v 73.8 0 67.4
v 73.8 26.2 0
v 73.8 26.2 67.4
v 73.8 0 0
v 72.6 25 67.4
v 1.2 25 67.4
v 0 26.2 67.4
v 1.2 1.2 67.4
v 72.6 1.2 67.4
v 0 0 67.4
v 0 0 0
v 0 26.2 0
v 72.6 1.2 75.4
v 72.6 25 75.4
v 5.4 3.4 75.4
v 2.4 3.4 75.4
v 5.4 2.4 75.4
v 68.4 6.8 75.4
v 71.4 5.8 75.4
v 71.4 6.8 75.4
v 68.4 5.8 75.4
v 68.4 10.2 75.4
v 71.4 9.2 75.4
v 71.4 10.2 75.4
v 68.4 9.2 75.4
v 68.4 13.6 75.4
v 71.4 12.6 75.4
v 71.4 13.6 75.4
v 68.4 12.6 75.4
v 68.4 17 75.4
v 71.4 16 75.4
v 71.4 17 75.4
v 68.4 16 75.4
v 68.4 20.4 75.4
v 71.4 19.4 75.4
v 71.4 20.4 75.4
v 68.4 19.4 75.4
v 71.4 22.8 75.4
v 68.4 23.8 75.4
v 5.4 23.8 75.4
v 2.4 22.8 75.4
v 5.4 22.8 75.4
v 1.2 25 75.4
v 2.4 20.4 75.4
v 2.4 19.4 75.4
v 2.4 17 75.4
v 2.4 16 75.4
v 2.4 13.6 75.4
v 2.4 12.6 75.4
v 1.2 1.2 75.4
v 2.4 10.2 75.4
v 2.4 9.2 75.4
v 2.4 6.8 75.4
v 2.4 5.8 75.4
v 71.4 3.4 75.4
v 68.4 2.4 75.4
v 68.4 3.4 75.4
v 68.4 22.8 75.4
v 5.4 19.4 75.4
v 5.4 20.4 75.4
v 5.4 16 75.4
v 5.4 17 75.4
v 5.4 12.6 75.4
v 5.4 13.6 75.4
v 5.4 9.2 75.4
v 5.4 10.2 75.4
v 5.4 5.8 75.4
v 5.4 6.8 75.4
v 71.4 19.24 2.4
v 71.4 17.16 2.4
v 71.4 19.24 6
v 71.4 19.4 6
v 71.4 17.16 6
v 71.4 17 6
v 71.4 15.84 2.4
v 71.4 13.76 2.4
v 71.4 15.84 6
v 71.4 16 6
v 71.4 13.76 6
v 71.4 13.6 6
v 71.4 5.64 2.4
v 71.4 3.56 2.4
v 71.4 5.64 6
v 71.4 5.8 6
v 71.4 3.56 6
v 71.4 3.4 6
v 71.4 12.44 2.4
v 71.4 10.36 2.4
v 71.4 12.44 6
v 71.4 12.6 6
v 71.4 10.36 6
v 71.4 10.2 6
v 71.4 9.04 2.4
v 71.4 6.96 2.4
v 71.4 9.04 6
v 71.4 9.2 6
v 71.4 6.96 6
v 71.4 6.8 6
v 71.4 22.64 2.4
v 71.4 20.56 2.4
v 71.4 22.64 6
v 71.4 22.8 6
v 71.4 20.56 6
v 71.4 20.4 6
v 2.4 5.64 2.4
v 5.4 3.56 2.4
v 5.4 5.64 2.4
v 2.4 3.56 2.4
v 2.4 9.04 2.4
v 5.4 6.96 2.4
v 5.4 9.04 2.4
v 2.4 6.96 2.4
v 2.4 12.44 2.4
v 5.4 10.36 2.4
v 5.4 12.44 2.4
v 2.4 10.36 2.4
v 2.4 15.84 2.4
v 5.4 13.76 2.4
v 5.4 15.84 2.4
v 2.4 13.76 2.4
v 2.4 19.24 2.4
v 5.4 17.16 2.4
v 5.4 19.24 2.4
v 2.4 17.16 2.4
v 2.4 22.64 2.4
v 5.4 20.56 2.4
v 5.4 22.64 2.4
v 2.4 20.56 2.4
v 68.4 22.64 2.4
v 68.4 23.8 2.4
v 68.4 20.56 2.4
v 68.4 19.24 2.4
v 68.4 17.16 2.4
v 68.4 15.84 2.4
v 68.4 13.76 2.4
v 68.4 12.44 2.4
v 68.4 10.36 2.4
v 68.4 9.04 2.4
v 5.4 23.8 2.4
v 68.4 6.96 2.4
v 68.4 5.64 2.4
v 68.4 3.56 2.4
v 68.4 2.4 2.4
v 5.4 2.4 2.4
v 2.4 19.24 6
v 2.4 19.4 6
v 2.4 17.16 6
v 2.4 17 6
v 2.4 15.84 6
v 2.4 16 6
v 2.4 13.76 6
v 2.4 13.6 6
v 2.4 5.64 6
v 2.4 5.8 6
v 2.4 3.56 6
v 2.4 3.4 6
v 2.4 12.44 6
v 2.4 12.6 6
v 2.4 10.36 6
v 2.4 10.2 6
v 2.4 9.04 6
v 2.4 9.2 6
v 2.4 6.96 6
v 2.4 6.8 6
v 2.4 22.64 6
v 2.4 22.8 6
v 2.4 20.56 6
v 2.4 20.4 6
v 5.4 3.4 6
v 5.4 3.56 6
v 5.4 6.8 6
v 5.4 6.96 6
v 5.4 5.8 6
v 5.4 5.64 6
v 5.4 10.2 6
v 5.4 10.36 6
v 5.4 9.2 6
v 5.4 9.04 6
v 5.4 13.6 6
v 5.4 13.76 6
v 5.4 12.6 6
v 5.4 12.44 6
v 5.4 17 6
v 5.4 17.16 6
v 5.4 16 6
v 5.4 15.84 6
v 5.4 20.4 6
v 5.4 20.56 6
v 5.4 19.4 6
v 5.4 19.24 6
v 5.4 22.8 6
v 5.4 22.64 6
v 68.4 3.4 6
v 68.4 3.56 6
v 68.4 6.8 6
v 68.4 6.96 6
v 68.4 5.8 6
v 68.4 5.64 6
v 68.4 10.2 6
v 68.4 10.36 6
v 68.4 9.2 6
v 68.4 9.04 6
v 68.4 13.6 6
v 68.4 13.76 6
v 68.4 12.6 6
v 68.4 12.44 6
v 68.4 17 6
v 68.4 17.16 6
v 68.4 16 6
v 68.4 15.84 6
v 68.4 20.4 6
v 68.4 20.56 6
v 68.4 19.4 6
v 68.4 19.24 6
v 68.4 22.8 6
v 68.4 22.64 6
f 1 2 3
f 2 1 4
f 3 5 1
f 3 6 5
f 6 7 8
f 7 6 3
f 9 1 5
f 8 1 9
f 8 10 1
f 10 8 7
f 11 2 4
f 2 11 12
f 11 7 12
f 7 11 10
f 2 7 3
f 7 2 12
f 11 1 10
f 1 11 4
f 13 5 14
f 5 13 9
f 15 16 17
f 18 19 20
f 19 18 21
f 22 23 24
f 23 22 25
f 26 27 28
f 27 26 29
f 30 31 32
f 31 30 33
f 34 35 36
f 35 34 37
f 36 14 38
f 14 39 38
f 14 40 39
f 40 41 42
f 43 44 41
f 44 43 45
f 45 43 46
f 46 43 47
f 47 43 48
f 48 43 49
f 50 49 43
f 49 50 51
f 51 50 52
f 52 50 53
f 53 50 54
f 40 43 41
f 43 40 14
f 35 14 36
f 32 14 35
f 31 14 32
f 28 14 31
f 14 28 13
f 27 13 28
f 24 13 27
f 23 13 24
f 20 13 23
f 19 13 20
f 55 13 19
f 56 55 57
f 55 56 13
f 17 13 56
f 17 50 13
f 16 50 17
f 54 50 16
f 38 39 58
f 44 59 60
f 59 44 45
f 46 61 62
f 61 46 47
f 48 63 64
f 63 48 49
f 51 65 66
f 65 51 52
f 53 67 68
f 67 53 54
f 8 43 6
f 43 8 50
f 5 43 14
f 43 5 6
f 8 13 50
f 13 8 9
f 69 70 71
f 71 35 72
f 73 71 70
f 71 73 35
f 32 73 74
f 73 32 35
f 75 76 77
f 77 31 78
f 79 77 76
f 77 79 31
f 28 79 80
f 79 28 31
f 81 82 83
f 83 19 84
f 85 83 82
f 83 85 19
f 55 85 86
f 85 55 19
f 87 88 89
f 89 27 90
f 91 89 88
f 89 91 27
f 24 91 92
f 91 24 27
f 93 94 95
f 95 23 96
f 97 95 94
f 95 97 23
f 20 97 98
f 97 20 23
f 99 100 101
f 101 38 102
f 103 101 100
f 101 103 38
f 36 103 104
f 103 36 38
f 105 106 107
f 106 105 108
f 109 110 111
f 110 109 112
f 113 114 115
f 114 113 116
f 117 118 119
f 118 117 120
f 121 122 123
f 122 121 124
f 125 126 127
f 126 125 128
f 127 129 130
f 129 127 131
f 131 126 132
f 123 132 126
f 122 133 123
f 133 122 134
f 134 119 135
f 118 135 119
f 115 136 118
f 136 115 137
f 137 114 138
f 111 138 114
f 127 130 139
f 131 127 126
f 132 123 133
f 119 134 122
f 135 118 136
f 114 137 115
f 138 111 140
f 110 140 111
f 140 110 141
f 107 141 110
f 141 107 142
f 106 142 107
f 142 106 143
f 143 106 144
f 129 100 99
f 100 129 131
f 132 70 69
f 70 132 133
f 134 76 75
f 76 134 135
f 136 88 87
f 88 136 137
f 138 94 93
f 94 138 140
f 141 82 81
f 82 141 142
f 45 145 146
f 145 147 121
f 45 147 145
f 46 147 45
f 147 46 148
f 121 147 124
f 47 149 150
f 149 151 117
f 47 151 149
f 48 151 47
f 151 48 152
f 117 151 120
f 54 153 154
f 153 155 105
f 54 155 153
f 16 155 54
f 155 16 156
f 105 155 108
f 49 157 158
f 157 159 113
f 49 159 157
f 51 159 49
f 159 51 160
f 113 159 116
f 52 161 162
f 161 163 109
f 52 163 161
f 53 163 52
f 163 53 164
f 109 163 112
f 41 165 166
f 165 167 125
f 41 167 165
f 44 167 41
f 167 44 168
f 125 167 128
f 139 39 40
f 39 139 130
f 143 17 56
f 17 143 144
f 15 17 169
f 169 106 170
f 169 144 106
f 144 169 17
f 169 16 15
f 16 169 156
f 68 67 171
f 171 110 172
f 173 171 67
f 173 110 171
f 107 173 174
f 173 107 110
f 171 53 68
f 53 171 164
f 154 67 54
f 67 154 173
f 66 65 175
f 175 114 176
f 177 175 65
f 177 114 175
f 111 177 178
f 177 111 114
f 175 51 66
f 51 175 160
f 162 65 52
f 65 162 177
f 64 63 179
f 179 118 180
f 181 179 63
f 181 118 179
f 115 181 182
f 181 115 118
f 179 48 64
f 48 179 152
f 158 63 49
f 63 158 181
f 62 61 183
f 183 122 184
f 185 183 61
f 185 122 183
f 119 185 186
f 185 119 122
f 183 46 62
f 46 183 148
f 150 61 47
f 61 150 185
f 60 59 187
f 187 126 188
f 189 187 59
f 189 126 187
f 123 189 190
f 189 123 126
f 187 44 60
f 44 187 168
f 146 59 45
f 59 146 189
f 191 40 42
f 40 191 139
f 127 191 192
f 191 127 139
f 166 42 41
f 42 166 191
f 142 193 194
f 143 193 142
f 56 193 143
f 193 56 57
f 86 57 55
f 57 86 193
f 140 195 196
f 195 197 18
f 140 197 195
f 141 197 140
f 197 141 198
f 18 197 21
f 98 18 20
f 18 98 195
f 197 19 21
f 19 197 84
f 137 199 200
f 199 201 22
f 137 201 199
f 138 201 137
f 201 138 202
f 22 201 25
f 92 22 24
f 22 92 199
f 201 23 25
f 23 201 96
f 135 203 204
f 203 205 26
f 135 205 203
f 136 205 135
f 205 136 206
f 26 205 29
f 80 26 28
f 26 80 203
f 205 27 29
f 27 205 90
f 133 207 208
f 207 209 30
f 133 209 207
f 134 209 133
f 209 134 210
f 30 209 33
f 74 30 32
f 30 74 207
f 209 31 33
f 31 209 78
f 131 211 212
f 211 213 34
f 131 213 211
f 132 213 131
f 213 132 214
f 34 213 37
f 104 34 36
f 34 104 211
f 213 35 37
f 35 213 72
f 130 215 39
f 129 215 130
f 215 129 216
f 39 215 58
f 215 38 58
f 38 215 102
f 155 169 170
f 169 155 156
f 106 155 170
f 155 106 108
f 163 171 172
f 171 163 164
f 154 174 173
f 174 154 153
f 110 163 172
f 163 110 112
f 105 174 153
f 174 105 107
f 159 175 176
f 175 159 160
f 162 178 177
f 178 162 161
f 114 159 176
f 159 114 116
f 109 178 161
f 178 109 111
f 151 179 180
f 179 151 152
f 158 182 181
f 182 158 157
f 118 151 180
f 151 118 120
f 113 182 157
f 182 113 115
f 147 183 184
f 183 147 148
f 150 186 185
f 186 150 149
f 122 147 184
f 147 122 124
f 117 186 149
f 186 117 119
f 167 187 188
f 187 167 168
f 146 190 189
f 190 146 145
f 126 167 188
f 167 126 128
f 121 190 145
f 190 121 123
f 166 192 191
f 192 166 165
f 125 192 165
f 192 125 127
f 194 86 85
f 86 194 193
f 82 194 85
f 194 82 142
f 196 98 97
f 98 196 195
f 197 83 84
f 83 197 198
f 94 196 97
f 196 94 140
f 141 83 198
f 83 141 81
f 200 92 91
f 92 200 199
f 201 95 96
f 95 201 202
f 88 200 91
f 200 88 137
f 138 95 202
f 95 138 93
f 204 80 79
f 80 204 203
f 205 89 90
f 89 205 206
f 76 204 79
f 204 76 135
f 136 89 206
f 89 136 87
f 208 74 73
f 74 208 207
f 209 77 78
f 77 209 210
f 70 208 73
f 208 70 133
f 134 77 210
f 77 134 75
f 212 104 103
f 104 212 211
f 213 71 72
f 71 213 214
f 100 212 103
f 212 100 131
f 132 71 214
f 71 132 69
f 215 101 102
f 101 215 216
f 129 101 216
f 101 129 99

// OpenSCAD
// MODIFY BELOW VARIABLES TO CUSTOMISE
wallthickness=1.2; // this is the wall of the lip, the box is twice as thick

internalx=69; // internal x dimension

internaly=21.4; // internal y dimension

internalz=85; // internal overall z dimension 75

internal_lidz=20; // this is taken of off the internalz for the bottom height and acts as the lid internal height

lip_overlap = internal_lidz/2.5; // how much overlap between box and lid, this works as a default but can be shrunk as needed

lipspacing=0; // this amount is take off of the wall thickness on the lip to increase spacing, if your lid is too tight you can increase this but it will reduce the actual wall thickness on the lip so too much and you will have to increase the wallthickness to compensate. Should be 0 in ideal world, you will likely be better just lightly sanding the lip unless your printer is way out

//#############################
// INTERNAL VARIABLES, DO NOT MODIFY
internal_botz=internalz-internal_lidz;

actual_y=internaly+(4*wallthickness);
actual_x=internalx+(4*wallthickness);
actual_lidz=internal_lidz+(2*wallthickness);
actual_botz=internal_botz+(2*wallthickness);

lip_x = internalx+(2*wallthickness);
lip_y = internaly+(2*wallthickness);


//###########################

module bottom() {
    difference() {
        union() {
            // outer cube
            scale([actual_x,actual_y,actual_botz])cube(1);
            // inner cube incl. lid
            translate([wallthickness,wallthickness,actual_botz])scale([lip_x,lip_y,lip_overlap])cube(1);
        }
        // remove inner volume
        translate([(2*wallthickness),(2*wallthickness),(2*wallthickness)])scale([internalx,internaly,internalz])cube(1);
    }
    // add gliders for filters
    for (i=[0:6]) translate([2*wallthickness,2*wallthickness+3.4*i,0])scale([3,1,actual_botz+lip_overlap])cube(1);
    for (i=[0:6]) translate([actual_x-2*wallthickness-3,2*wallthickness+3.4*i,0])scale([3,1,actual_botz+lip_overlap])cube(1);
    // make gladers slioghtly thicker at the bottom 10mm to "lock" the filters securely
    for (i=[0:6]) translate([2*wallthickness,2*wallthickness+3.4*i-0.16,0])scale([3,1.32,6])cube(1);
    for (i=[0:6]) translate([actual_x-2*wallthickness-3,2*wallthickness+3.4*i-0.16,0])scale([3,1.32,6])cube(1);    
}


module lid() {
    difference() {
        scale([actual_x,actual_y,actual_lidz+lip_overlap])cube(1);
        
        translate([(2*wallthickness),(2*wallthickness),-.1])scale([internalx,internaly,internal_lidz+lip_overlap+.1])cube(1);
        
        translate([(wallthickness)-lipspacing/2,(wallthickness)-lipspacing/2,-.1])scale([lip_x+lipspacing,lip_y+lipspacing,lip_overlap+.3])cube(1);
    }
}

//translate([0,0,actual_botz + lip_overlap + 10])lid();


bottom();
//lid();
